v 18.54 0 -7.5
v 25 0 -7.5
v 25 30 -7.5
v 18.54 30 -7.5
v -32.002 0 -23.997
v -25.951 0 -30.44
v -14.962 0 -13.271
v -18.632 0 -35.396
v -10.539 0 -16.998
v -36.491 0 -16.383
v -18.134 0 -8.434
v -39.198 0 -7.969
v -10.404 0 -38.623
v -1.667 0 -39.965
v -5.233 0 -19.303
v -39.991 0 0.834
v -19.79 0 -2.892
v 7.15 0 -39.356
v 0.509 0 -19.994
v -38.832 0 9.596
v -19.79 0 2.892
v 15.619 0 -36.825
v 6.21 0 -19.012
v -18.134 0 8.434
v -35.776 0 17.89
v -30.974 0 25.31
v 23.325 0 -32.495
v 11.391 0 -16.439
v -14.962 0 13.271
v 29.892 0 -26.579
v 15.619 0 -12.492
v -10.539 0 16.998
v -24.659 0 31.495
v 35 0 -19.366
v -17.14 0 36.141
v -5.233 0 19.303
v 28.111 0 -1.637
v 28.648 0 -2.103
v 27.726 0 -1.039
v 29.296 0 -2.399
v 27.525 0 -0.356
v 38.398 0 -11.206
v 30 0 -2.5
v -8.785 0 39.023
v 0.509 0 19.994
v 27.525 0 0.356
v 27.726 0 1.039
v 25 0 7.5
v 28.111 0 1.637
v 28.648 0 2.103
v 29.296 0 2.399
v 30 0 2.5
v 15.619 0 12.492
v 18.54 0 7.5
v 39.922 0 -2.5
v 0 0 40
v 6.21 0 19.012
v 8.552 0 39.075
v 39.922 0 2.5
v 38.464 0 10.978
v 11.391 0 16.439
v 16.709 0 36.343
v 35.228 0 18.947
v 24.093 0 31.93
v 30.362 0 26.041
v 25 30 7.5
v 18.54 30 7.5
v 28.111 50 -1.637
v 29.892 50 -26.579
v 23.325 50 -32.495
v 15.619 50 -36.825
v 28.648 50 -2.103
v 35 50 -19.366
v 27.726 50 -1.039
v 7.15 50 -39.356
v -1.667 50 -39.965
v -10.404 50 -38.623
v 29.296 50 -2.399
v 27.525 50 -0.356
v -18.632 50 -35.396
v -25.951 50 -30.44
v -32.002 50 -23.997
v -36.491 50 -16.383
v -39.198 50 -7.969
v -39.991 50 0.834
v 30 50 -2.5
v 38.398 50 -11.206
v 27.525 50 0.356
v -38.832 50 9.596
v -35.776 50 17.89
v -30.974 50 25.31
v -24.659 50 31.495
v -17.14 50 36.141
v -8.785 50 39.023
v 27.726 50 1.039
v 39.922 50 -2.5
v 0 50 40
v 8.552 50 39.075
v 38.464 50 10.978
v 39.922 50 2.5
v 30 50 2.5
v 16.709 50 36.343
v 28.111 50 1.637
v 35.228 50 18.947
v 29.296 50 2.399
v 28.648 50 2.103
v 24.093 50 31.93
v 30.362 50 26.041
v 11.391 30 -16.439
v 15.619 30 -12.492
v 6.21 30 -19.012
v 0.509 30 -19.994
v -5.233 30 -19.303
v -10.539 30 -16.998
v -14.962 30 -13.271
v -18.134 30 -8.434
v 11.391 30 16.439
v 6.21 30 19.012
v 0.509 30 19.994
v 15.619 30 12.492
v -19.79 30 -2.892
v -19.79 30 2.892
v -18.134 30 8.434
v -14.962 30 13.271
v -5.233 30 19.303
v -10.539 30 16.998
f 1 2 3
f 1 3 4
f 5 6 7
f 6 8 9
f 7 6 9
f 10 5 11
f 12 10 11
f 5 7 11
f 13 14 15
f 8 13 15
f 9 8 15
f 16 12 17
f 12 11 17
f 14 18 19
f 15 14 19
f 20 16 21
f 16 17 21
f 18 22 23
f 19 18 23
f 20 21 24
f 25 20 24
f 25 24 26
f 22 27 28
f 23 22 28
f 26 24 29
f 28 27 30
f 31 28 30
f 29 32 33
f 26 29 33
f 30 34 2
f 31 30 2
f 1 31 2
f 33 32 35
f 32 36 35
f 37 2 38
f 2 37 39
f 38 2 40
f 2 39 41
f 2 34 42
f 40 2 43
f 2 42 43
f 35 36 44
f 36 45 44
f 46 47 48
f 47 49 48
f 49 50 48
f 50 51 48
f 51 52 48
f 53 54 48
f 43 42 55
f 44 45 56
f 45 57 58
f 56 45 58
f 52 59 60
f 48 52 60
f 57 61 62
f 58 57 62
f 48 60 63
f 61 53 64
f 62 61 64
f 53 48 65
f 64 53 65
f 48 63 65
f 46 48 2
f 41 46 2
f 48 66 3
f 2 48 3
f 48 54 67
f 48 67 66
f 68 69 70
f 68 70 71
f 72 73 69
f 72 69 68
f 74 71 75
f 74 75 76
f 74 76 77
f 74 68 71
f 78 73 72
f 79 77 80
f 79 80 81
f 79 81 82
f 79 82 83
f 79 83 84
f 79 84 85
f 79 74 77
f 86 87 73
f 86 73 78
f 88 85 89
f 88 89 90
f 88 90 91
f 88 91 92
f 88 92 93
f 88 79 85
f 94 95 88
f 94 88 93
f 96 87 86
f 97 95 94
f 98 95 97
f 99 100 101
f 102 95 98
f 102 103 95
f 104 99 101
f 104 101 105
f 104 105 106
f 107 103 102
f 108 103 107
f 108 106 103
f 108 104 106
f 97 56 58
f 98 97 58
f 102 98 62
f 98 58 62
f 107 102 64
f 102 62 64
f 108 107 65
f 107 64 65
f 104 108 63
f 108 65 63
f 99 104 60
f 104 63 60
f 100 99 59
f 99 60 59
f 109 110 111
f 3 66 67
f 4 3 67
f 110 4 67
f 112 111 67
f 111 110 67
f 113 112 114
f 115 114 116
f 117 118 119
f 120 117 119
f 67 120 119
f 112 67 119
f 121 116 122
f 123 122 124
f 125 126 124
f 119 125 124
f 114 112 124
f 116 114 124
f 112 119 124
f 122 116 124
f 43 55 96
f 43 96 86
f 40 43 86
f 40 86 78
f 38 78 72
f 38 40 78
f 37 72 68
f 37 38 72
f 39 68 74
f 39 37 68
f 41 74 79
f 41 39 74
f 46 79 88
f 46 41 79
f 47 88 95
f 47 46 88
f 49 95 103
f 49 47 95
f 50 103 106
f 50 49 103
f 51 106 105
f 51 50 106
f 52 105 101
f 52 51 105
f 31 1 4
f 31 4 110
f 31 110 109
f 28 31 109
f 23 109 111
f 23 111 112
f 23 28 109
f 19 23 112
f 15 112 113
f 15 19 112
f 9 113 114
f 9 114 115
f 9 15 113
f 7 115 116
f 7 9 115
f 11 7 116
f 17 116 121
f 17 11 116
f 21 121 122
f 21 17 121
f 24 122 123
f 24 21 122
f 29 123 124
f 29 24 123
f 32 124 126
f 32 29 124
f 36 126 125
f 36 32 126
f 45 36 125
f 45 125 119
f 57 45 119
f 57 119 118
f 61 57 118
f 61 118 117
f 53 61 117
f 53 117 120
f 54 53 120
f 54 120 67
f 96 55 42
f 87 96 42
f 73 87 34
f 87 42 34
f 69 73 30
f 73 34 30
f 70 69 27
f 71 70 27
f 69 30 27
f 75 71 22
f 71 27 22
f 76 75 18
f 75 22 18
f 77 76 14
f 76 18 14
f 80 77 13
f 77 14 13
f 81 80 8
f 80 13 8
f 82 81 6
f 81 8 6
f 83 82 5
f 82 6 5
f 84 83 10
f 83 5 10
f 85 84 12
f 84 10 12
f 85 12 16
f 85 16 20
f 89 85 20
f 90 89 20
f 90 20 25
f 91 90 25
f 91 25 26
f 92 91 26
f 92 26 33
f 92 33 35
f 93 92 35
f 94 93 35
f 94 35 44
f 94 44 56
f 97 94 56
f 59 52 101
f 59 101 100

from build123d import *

# Parameters (mm, degrees)
SKETCH_1_R          = 40
EXTRUDE_1_DEPTH     = 50
CUT_EXTRUDE_1_DEPTH = 30
CUT_EXTRUDE_2_DEPTH = 76.498344353


with BuildPart() as part:
    # 草图1 → 凸台-拉伸1 (new body)
    with BuildSketch(Plane(origin=(0, 0, 0), x_dir=(1, 0, 0), z_dir=(0, 1, 0))):
        Circle(SKETCH_1_R)
    extrude(amount=EXTRUDE_1_DEPTH)

    # 草图2 → 切除-拉伸1 (cut)
    with BuildSketch(Plane.XZ):
        with BuildLine():
            Line((18.540496218, 7.5), (25, 7.5))
            Line((25, 7.5), (25, -7.5))
            Line((25, -7.5), (18.540496218, -7.5))
            ThreePointArc((18.540496218, -7.5), (-20, 0), (18.540496218, 7.5))
        make_face()
    extrude(amount=-CUT_EXTRUDE_1_DEPTH, mode=Mode.SUBTRACT)

    # 草图4 → 切除-拉伸2 (cut, through all)
    with BuildSketch(Plane.XZ):
        with BuildLine():
            Line((40, -2.5), (30, -2.5))
            ThreePointArc((30, -2.5), (27.5, 0), (30, 2.5))
            Line((30, 2.5), (40, 2.5))
            ThreePointArc((40, 2.5), (42.5, 0), (40, -2.5))
        make_face()
    extrude(amount=-CUT_EXTRUDE_2_DEPTH, mode=Mode.SUBTRACT)


solid = part.part
